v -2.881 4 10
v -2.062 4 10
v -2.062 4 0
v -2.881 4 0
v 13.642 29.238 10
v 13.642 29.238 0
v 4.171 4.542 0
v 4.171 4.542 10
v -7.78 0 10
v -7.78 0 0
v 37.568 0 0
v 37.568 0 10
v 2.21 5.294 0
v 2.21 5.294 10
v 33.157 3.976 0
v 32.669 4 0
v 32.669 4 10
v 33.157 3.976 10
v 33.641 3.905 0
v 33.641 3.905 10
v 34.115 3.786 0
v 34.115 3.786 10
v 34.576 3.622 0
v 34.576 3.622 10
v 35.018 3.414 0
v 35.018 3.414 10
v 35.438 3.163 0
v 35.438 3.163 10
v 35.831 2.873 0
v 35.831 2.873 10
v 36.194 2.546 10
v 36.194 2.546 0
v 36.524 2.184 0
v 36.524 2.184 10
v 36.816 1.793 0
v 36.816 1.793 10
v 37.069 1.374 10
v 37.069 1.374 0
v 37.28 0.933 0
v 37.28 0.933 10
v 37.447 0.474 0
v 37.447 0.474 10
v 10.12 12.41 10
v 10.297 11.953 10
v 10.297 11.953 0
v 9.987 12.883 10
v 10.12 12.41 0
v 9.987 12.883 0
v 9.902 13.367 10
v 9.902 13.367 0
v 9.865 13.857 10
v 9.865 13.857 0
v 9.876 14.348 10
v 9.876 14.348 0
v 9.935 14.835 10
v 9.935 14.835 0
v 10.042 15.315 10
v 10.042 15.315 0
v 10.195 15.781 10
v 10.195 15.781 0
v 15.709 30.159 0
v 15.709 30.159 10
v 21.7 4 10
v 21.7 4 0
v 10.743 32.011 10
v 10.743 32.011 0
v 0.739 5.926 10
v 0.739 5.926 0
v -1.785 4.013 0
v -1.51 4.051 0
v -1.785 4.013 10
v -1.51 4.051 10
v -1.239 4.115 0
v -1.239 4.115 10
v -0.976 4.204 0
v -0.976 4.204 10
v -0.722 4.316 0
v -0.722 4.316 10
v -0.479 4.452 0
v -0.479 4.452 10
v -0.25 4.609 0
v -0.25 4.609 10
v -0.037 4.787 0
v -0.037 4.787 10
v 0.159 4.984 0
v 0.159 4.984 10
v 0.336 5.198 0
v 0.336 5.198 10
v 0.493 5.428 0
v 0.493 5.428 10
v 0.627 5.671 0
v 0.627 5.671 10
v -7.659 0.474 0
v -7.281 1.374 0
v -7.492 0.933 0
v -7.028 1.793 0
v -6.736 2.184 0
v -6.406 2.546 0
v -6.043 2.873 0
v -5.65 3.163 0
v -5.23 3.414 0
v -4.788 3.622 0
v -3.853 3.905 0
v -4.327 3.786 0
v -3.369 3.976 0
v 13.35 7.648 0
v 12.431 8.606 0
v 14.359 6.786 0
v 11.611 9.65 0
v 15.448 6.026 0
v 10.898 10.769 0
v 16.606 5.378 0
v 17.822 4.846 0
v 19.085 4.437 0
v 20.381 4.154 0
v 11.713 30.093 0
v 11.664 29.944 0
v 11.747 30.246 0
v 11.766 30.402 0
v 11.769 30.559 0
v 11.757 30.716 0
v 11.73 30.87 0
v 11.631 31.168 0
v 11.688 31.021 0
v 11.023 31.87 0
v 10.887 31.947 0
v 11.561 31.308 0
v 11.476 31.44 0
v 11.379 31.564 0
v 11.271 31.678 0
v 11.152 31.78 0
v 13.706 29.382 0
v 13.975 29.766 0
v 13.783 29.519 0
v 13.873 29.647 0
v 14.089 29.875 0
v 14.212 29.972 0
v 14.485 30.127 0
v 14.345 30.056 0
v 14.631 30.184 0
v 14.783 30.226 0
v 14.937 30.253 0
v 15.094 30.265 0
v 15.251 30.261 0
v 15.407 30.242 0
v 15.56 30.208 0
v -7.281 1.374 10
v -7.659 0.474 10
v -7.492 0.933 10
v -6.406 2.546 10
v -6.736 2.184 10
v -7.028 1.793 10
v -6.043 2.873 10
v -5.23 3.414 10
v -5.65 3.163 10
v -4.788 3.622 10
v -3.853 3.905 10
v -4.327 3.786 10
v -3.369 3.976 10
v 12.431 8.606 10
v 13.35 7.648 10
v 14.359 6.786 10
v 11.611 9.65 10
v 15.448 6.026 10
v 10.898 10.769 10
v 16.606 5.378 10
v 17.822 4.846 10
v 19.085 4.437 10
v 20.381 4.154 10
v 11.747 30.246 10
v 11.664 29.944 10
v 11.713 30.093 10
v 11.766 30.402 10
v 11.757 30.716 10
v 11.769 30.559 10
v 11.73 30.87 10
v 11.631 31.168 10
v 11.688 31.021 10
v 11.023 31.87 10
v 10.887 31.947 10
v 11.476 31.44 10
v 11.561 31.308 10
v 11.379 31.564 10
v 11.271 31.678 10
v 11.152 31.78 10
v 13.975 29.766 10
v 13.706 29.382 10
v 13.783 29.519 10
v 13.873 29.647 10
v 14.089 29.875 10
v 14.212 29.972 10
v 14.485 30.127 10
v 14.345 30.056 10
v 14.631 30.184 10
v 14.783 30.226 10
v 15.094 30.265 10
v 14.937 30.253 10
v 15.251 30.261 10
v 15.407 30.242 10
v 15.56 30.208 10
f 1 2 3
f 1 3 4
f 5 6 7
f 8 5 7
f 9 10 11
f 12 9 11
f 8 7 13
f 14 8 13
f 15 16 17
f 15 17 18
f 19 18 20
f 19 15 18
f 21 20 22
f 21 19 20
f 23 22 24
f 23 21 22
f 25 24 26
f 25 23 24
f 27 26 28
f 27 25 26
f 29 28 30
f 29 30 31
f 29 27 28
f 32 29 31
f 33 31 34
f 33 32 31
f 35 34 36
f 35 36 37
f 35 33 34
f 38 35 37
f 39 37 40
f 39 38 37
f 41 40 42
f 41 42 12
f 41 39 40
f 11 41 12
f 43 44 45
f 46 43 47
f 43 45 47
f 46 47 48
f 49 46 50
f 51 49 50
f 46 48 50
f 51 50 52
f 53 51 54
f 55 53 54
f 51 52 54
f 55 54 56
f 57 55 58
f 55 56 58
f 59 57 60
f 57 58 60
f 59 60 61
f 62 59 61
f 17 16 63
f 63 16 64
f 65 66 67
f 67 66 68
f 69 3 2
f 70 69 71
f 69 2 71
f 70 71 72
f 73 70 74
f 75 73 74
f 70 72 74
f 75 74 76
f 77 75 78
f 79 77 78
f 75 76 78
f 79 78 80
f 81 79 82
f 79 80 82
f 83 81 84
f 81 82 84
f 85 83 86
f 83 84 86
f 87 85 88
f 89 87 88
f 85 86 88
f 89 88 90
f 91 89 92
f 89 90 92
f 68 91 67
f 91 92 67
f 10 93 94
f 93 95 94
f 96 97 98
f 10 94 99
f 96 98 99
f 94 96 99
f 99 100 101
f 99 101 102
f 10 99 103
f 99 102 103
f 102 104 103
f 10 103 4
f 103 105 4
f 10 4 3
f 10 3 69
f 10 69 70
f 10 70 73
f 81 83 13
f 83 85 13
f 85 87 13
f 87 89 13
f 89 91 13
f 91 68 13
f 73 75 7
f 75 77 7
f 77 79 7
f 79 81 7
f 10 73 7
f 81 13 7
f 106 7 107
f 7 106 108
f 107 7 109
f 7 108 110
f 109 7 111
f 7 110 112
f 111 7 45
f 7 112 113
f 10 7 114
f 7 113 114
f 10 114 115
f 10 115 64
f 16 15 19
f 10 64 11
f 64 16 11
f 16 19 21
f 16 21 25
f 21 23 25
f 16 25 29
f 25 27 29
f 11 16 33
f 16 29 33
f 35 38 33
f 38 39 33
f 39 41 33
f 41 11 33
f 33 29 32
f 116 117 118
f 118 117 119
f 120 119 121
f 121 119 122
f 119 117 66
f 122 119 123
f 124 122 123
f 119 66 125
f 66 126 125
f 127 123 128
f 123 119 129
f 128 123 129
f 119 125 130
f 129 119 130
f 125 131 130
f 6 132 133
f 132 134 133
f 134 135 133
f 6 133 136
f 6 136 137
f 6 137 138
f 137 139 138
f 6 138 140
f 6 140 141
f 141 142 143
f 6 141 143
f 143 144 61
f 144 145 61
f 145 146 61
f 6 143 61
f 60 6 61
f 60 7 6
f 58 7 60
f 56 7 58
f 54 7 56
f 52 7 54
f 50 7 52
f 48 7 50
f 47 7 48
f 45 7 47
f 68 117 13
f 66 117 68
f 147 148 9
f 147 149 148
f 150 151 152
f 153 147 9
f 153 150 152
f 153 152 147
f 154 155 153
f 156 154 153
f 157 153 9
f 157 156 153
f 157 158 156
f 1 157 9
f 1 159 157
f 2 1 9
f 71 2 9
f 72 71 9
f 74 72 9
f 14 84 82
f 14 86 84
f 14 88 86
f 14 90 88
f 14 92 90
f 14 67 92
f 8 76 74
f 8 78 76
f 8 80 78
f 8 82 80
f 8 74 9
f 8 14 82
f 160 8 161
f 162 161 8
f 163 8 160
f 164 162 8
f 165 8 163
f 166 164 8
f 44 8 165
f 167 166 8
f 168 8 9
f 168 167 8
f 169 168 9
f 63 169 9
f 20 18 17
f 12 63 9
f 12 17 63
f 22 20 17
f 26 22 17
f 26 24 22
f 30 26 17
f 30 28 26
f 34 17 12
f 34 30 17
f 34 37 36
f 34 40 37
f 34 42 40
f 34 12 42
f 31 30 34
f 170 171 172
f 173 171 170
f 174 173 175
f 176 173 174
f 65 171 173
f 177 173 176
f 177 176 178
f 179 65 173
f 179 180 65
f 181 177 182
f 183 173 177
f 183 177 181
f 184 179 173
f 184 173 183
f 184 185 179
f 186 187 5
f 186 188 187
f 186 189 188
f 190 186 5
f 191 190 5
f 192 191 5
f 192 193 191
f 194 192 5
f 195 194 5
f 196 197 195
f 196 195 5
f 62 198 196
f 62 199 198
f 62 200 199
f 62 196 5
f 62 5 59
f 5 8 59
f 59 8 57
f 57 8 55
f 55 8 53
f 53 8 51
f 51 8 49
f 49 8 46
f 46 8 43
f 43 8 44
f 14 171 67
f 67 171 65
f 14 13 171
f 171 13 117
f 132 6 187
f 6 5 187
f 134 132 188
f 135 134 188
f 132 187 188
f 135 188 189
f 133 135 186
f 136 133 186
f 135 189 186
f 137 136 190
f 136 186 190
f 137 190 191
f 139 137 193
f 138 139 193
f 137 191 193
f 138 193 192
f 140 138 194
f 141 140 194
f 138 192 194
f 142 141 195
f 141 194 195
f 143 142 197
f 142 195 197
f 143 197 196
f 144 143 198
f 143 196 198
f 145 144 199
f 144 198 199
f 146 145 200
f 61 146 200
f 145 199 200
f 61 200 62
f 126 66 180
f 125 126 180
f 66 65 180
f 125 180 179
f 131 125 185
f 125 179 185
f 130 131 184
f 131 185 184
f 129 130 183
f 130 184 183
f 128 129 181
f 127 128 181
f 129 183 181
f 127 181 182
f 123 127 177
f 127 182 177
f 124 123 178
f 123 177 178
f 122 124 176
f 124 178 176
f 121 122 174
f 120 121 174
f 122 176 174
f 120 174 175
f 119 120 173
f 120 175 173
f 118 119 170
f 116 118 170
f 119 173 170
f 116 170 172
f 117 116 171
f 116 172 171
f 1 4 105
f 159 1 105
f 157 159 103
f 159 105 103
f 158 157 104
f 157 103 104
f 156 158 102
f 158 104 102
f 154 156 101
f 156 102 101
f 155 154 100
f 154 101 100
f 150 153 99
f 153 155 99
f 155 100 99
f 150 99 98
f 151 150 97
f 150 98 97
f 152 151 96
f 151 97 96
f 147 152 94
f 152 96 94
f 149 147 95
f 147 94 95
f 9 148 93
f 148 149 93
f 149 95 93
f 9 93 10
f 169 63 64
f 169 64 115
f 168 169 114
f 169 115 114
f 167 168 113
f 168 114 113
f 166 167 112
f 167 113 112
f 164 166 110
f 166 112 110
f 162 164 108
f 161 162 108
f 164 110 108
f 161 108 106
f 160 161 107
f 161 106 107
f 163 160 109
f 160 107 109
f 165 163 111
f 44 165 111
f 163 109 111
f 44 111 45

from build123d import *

# Parameters (mm, degrees)
F1_DEPTH    = 10
F2_T1_DEPTH = 10
F2_T3_DEPTH = 34.4948974279
F2_T5_DEPTH = 34.4948974279
F3_R        = 3
F4_R        = 1.59999


# Not quite as in the source:
# - a fillet or chamfer that OpenCascade refuses, or shapes differently, is made with other operations: its cross-section is extruded or revolved along the edge and cut away or added
# - a fillet or chamfer is up to 0.001 mm smaller than in the source, because OpenCascade refuses the exact size


with BuildPart() as f1:
    # F0 (on Top) → F1 (new body)
    with BuildSketch(Plane.XY):
        with BuildLine():
            Line((-7.7799167484, 4), (-7.7799167484, 0))
            Line((-7.7799167484, 0), (37.5679595768, 0))
            Line((37.5679595768, 0), (37.5679595768, 4))
            Line((37.5679595768, 4), (21.6996651143, 4))
            ThreePointArc((21.6996651143, 4), (13.9894641382, 7.0819259987), (9.5494964602, 14.0984888306))
            Line((9.5494964602, 14.0984888306), (15.7092516907, 30.1592148483))
            Line((15.7092516907, 30.1592148483), (14.215355652, 30.732167399))
            Line((14.215355652, 30.732167399), (4.170825278, 4.5424172749))
            Line((4.170825278, 4.5424172749), (2.2100867272, 5.2944174977))
            Line((2.2100867272, 5.2944174977), (12.2367563651, 31.4375981759))
            Line((12.2367563651, 31.4375981759), (10.7428603263, 32.0105507266))
            Line((10.7428603263, 32.0105507266), (0, 4))
            Line((0, 4), (-7.7799167484, 4))
        make_face()
    extrude(amount=F1_DEPTH)

    # F2: fillet of radius 5 on 3 edges, made by hand

    # F2_s2 → F2_t1 (join)
    with BuildSketch(Plane.XY):
        with BuildLine():
            ThreePointArc((10.2974988853, 11.9526797446), (9.8650823787, 13.8567183835), (10.1948614585, 15.7811905013))
            Line((10.1948614585, 15.7811905013), (9.5494964602, 14.0984888306))
            ThreePointArc((9.5494964602, 14.0984888306), (9.8781857469, 13.0097891124), (10.2974988853, 11.9526797446))
        make_face()
    extrude(amount=F2_T1_DEPTH)

    # F2_s4 → F2_t3 (cut)
    with BuildSketch(Plane.XY.offset(-12.2474487139)):
        with BuildLine():
            ThreePointArc((-2.8809372628, 4), (-6.043214923, 2.8729833462), (-7.7799167484, 0))
            Line((-7.7799167484, 0), (-7.7799167484, 4))
            Line((-7.7799167484, 4), (-2.8809372628, 4))
        make_face()
    extrude(amount=F2_T3_DEPTH, mode=Mode.SUBTRACT)

    # F2_s6 → F2_t5 (cut)
    with BuildSketch(Plane.XY.offset(-12.2474487139)):
        with BuildLine():
            ThreePointArc((32.6689800913, 4), (35.8312577514, 2.8729833462), (37.5679595768, 0))
            Line((37.5679595768, 0), (37.5679595768, 4))
            Line((37.5679595768, 4), (32.6689800913, 4))
        make_face()
    extrude(amount=F2_T5_DEPTH, mode=Mode.SUBTRACT)

    # F3
    f3_edges = [f1.edges().sort_by_distance(p)[0] for p in [
        (0, 4, 5),
    ]]
    fillet(f3_edges, radius=F3_R)

    # F4 (radius 1.6 in the source; OpenCascade refuses exactly that, so slightly less here)
    f4_edges = [f1.edges().sort_by_distance(p)[0] for p in [
        (12.236756, 31.437598, 5),
        (14.215356, 30.732167, 5),
    ]]
    fillet(f4_edges, radius=F4_R)


solid = f1.part
